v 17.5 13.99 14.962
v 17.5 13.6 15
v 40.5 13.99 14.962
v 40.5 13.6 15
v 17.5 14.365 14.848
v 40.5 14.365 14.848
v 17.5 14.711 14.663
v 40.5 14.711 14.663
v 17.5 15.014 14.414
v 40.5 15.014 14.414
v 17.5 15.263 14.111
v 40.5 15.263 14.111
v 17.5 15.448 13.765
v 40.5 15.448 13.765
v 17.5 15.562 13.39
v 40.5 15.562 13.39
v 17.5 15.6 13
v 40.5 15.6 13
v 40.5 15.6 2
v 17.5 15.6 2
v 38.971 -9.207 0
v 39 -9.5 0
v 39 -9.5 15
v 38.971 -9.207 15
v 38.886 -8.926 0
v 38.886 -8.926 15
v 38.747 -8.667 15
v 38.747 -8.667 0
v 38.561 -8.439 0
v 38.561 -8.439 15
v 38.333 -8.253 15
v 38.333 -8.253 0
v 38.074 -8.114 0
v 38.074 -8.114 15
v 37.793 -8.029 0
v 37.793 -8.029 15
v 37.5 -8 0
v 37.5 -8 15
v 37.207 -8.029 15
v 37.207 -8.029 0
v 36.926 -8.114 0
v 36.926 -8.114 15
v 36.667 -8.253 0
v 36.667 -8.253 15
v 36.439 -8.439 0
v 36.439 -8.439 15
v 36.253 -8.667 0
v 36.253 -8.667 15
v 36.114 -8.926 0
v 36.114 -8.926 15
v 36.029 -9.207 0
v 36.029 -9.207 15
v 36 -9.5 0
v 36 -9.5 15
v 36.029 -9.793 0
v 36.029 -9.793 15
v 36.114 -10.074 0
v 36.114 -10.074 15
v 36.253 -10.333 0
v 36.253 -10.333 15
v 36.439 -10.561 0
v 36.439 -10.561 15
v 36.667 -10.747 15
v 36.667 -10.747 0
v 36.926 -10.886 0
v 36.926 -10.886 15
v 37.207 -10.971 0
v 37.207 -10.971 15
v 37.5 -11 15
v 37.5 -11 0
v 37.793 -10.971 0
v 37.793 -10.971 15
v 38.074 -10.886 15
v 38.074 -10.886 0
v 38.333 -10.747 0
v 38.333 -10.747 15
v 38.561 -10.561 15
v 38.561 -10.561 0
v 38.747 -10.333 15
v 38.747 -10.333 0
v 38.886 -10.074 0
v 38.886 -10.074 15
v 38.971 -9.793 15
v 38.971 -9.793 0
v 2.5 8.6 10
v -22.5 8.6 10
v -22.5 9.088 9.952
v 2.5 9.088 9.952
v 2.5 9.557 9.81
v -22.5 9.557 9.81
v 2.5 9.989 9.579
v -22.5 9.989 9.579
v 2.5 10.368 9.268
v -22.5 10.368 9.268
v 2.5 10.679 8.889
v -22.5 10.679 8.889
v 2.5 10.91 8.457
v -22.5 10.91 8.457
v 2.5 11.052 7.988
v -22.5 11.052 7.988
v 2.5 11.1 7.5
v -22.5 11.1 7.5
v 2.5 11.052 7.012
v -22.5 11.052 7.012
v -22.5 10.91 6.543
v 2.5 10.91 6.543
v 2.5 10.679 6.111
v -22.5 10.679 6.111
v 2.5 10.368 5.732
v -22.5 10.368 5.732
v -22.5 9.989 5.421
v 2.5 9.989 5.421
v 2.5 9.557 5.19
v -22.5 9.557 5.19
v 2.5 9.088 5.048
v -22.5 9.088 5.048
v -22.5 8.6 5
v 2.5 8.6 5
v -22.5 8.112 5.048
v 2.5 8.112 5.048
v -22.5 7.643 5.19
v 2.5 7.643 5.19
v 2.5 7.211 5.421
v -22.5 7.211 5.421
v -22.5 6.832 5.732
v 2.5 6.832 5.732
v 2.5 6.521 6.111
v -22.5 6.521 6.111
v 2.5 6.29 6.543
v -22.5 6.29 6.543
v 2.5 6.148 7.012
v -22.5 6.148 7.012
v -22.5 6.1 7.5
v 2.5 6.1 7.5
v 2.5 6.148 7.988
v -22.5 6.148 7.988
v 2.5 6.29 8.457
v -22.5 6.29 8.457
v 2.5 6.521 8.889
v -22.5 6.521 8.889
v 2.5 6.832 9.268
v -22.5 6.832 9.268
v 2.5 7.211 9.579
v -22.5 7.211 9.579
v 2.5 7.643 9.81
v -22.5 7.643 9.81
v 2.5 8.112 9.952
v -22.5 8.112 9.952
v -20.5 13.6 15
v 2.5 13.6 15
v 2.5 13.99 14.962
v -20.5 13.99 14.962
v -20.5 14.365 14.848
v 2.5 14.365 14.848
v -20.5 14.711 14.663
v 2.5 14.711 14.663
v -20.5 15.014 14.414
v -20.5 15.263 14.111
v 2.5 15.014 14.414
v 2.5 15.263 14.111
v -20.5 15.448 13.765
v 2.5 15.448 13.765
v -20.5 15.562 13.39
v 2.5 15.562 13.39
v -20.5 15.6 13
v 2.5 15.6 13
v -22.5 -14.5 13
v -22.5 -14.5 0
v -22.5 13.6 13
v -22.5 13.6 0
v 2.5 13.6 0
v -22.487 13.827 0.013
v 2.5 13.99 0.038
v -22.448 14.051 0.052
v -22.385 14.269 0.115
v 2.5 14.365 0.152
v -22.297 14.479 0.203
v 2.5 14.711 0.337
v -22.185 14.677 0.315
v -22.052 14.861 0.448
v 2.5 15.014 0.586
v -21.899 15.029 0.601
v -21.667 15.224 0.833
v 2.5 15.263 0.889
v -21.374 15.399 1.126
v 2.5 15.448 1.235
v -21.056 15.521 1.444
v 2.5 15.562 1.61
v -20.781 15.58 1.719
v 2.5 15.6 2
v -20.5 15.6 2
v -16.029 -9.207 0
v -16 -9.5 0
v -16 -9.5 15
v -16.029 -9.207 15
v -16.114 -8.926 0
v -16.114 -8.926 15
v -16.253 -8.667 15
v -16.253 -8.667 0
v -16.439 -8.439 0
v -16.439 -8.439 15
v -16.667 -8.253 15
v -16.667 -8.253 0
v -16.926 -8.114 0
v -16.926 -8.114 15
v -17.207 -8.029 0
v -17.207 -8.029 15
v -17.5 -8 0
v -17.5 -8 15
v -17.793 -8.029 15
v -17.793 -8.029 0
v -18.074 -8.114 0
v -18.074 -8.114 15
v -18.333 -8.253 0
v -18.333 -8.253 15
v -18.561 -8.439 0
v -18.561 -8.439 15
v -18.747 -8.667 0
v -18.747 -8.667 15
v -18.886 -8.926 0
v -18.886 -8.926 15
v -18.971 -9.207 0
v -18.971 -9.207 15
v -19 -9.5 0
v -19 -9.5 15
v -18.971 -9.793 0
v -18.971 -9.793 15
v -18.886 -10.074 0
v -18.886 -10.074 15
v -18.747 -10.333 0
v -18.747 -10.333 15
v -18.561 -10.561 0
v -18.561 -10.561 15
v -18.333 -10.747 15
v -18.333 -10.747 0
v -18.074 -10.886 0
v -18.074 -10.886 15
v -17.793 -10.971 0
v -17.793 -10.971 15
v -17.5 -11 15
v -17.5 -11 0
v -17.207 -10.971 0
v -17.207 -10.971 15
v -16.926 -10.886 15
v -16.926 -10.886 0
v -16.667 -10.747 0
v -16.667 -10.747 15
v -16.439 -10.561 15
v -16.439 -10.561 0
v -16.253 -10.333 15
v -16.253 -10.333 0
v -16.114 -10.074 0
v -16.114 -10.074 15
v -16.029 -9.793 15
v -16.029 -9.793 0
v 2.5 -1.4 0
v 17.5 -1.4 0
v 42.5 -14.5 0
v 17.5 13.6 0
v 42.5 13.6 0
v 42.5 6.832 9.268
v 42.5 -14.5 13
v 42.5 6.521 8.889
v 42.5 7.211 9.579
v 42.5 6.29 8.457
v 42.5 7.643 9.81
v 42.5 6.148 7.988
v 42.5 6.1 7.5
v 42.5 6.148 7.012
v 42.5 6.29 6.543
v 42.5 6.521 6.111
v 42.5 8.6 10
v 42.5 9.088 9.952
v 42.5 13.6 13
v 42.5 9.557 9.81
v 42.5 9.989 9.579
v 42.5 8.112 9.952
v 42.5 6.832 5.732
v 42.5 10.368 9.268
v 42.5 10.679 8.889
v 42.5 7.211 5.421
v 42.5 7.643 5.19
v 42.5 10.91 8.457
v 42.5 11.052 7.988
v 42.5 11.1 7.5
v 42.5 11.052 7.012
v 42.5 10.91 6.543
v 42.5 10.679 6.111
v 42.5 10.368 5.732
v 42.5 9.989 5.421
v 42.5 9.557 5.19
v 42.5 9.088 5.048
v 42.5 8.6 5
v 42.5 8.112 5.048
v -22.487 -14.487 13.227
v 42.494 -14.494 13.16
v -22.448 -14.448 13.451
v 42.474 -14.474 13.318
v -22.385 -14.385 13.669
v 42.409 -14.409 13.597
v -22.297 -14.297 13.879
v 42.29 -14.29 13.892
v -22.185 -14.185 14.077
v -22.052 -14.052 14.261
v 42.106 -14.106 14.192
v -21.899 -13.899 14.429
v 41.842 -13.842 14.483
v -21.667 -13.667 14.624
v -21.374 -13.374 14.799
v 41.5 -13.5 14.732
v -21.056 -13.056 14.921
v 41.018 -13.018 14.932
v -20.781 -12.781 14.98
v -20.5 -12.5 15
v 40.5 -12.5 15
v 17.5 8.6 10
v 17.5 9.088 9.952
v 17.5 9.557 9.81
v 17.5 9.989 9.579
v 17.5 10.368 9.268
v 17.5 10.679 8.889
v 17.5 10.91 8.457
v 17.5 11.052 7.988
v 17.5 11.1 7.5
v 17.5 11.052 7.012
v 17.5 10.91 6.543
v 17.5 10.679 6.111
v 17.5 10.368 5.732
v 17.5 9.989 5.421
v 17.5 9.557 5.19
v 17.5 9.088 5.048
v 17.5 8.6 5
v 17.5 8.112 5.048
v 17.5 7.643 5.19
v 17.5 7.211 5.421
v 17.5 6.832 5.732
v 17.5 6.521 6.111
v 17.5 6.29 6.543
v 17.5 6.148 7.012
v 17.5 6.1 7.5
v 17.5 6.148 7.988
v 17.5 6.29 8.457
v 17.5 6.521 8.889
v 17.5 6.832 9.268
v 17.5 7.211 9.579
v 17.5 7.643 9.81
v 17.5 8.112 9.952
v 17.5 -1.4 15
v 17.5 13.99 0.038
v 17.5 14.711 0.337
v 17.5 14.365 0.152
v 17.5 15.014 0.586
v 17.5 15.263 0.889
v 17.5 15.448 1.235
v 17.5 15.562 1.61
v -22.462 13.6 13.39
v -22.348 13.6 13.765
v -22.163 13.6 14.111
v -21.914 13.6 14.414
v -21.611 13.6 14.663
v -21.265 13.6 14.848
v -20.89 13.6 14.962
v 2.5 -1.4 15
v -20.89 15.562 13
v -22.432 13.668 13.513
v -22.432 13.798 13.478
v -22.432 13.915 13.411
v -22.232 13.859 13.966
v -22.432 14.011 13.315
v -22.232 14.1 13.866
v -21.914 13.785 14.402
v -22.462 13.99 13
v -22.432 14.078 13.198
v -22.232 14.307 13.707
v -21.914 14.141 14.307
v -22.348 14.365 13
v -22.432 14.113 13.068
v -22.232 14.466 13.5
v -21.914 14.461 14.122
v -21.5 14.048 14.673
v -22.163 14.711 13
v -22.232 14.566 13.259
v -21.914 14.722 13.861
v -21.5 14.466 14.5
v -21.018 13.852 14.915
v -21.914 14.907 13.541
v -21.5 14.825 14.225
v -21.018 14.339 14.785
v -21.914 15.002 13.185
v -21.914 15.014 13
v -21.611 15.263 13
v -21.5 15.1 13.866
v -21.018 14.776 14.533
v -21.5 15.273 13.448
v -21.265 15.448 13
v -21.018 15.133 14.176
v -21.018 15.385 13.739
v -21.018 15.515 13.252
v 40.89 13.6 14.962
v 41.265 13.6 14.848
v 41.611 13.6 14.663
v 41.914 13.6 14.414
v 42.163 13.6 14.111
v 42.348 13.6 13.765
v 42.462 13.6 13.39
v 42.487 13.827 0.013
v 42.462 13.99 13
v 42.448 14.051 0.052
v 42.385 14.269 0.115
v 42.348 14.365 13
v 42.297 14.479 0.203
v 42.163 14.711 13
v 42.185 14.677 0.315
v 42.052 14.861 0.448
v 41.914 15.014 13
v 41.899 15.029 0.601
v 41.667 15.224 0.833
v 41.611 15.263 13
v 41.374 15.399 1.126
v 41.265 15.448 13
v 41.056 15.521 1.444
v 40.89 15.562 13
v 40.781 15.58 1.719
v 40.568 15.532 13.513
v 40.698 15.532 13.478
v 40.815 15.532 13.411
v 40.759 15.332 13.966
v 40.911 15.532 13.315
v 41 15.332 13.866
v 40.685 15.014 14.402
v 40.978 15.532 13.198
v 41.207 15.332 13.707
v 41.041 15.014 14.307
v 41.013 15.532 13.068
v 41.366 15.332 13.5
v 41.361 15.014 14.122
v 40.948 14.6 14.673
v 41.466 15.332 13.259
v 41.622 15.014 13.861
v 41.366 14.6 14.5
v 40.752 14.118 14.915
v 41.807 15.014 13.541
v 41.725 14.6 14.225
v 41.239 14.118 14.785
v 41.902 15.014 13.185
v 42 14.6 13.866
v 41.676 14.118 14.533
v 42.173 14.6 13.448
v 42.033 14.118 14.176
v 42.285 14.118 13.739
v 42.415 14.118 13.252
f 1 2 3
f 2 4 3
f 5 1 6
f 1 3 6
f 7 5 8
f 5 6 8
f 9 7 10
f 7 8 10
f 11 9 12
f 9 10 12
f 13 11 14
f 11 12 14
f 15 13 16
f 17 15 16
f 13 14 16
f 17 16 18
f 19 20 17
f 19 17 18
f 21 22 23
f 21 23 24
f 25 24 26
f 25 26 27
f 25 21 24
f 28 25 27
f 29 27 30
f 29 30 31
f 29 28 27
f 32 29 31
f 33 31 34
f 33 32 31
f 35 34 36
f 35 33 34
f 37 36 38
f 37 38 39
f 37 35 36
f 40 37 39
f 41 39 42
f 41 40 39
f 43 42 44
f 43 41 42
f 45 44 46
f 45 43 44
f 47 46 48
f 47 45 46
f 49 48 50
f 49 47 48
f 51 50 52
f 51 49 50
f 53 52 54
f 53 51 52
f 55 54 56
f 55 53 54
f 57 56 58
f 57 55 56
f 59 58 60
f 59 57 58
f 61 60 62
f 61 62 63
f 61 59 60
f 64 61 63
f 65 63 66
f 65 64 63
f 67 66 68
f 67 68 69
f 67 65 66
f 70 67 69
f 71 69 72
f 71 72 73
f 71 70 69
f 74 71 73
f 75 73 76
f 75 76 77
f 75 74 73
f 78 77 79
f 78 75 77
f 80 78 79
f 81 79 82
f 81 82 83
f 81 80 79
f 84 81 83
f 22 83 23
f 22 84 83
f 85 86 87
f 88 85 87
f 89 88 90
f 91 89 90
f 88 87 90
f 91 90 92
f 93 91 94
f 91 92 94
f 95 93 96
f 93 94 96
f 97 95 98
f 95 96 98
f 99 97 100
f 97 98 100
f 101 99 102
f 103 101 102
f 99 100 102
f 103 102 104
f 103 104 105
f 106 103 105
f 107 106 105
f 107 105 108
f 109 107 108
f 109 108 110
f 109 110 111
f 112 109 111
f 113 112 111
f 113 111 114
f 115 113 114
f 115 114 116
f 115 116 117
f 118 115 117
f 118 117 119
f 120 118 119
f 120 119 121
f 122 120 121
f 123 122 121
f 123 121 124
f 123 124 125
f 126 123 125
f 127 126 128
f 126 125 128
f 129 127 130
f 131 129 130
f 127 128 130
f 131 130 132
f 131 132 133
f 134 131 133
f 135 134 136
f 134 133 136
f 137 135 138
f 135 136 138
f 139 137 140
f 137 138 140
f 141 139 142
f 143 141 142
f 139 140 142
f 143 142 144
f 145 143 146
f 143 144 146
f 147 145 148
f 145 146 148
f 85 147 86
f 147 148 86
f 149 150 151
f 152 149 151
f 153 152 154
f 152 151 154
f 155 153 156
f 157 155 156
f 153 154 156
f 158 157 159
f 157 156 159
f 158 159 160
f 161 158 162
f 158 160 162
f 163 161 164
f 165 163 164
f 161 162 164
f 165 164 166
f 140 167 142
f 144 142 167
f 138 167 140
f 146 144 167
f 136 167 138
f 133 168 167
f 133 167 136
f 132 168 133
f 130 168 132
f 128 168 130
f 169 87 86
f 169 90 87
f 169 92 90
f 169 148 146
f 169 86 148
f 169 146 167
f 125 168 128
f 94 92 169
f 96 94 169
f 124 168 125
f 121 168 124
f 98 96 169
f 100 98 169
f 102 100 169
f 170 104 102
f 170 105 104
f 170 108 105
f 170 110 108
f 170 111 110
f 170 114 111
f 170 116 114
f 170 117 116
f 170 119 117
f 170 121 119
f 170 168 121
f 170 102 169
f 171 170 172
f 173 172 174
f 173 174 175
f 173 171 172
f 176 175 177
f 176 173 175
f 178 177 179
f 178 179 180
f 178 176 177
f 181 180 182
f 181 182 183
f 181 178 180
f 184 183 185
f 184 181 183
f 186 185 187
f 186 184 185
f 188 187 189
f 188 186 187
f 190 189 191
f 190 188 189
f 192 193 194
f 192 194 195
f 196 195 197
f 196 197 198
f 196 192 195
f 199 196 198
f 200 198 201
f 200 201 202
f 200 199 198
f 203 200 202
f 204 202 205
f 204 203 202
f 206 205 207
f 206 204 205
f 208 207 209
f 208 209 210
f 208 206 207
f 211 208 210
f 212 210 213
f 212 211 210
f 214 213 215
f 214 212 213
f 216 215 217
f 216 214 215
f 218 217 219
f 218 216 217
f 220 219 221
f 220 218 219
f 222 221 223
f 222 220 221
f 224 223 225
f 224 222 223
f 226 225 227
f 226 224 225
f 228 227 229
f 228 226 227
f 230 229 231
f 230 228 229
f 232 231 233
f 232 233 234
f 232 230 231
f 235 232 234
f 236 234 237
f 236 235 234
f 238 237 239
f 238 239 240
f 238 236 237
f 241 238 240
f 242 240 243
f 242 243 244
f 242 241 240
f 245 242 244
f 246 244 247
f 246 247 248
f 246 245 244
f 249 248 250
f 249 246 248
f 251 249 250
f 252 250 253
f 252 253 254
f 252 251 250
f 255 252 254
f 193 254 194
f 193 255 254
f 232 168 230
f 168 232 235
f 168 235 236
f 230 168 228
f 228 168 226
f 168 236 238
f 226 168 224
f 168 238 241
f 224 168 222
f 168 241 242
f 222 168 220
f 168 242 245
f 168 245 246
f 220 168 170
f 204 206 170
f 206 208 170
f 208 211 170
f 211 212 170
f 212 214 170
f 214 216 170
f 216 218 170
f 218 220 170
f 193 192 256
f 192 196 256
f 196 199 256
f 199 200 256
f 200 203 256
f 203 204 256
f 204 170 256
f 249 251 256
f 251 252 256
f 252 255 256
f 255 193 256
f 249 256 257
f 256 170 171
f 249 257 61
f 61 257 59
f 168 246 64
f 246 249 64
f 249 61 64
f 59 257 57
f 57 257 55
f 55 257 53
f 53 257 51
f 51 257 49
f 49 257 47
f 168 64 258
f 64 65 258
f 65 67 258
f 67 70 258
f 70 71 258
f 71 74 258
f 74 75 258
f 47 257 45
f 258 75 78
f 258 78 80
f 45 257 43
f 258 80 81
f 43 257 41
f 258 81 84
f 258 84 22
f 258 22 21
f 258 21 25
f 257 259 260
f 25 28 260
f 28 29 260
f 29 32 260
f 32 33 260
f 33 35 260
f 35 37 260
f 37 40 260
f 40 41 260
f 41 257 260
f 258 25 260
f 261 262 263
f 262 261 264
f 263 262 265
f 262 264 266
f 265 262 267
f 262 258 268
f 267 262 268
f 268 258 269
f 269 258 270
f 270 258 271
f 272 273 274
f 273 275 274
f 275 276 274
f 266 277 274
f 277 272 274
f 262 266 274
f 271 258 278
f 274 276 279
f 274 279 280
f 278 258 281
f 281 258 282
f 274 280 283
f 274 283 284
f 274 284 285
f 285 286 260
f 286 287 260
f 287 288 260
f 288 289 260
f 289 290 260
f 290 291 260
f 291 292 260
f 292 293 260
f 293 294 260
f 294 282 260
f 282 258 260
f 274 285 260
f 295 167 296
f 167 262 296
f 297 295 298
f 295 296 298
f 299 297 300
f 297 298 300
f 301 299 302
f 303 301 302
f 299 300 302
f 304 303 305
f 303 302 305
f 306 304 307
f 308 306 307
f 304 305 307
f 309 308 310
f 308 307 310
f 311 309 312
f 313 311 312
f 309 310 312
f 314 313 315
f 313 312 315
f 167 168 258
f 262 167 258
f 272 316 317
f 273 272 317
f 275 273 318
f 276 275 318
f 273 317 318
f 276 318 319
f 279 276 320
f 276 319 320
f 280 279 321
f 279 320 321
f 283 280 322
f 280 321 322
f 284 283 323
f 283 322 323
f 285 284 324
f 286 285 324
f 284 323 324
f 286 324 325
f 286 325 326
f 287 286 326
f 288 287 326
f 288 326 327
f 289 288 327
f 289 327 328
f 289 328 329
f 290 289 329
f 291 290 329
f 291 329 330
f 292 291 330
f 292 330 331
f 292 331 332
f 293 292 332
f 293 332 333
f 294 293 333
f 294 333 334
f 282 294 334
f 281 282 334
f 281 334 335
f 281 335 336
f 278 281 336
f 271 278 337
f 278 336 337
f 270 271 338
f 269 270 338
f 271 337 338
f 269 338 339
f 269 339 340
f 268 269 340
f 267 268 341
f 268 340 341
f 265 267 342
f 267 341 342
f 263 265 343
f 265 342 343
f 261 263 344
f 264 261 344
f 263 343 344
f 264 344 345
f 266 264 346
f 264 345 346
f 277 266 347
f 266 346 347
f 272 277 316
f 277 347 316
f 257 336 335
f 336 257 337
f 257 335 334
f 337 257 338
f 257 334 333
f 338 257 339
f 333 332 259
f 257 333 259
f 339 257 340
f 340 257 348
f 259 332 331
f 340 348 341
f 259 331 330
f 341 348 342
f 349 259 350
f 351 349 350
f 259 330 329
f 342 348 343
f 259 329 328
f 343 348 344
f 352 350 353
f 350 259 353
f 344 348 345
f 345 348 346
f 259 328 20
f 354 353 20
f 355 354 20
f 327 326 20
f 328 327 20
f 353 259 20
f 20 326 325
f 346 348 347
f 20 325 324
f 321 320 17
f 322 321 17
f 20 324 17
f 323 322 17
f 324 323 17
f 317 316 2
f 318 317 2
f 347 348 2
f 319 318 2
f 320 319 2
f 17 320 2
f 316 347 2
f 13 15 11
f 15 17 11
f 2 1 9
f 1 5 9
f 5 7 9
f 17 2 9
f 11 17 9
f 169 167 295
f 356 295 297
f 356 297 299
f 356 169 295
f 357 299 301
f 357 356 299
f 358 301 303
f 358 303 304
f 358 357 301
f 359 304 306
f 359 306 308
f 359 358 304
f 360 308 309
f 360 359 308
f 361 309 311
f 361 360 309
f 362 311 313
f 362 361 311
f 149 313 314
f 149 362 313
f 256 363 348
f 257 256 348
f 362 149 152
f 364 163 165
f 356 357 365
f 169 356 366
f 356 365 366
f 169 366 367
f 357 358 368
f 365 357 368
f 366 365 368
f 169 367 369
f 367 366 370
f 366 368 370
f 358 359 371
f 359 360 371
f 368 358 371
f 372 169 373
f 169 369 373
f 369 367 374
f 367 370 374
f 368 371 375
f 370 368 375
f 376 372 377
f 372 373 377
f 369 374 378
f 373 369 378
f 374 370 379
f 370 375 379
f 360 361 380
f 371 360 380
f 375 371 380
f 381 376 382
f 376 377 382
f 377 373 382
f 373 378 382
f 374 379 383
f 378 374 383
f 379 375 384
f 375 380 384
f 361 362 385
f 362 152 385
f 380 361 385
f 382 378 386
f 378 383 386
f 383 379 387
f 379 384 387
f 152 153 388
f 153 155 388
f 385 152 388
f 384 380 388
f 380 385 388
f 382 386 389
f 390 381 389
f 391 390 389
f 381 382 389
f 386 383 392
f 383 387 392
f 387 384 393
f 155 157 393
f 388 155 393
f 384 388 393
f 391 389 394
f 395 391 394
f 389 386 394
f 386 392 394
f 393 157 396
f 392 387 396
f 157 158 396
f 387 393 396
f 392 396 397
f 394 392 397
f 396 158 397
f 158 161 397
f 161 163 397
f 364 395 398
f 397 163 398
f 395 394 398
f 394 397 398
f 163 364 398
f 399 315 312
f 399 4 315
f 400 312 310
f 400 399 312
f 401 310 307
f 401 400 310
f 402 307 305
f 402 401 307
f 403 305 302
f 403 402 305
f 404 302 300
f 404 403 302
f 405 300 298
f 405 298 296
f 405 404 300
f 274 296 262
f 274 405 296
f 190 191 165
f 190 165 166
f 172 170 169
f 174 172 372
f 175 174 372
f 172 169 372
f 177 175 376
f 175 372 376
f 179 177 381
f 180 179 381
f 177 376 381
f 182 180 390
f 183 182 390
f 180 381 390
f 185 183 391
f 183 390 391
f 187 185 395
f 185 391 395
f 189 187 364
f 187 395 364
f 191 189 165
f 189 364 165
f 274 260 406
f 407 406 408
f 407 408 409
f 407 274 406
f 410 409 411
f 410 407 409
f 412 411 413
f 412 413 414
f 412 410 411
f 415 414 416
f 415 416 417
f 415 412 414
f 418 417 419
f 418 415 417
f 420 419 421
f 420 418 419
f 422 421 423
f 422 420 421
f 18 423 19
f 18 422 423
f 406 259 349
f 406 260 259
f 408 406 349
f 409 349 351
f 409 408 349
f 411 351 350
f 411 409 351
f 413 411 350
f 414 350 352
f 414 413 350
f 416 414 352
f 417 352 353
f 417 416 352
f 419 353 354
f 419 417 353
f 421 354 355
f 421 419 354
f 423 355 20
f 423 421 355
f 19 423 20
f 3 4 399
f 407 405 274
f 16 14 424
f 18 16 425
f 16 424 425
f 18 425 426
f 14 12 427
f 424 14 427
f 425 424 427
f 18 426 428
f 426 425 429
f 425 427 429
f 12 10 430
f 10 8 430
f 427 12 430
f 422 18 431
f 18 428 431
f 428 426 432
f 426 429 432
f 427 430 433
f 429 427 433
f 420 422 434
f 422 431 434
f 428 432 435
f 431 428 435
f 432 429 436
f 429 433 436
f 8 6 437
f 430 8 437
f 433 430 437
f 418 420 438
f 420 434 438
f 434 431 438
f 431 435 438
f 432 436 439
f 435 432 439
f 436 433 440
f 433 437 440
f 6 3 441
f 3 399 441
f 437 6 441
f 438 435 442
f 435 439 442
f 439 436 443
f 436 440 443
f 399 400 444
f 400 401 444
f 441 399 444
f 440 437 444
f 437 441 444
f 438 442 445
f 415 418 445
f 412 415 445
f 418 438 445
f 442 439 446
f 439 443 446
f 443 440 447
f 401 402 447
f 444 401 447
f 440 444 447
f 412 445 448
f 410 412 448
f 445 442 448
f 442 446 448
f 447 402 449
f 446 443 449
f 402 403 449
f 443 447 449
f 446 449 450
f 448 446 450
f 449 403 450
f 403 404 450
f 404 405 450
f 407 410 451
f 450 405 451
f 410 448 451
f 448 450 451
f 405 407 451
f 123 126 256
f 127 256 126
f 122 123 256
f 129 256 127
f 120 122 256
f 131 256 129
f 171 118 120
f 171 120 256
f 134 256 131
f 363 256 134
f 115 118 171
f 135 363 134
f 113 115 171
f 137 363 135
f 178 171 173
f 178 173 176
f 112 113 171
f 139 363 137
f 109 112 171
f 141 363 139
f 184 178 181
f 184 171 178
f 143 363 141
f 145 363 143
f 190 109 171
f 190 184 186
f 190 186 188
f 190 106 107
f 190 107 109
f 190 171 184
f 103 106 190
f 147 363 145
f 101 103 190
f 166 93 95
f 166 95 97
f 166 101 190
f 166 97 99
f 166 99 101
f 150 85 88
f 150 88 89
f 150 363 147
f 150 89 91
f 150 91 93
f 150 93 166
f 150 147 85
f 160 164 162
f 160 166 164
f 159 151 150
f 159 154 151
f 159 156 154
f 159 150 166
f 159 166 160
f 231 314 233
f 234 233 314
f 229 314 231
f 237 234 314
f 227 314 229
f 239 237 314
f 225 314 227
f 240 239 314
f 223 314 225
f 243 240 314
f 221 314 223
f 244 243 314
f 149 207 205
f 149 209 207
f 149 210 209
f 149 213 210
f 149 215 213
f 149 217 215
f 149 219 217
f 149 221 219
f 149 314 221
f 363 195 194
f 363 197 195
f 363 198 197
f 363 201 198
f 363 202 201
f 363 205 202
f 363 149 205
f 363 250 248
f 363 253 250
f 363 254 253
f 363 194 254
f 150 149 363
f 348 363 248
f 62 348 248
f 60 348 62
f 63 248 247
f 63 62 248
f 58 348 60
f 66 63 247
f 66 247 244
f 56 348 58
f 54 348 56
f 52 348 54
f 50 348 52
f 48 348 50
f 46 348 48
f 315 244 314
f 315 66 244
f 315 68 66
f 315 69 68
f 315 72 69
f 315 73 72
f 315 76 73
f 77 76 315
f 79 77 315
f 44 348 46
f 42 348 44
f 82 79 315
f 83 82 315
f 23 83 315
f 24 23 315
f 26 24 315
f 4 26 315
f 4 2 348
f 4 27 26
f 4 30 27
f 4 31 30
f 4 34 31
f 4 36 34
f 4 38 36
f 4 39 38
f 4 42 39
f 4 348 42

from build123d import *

# Parameters (mm, degrees)
SKETCH1_W           = 65
SKETCH1_H           = 30.1
SKETCH1_R           = 1.5
BOSS_EXTRUDE1_DEPTH = 15
SKETCH2_R           = 2.5
CUT_EXTRUDE1_DEPTH  = 75
SKETCH3_W           = 15
SKETCH3_H           = 17
CUT_EXTRUDE2_DEPTH  = 75
FILLET2_R           = 2


with BuildPart() as part:
    # Sketch1 → Boss-Extrude1 (new body)
    with BuildSketch(Plane.XY):
        with Locations((10, 0.55)):
            Rectangle(SKETCH1_W, SKETCH1_H)
        with Locations((-17.5, -9.5)):
            Circle(SKETCH1_R, mode=Mode.SUBTRACT)
        with Locations((37.5, -9.5)):
            Circle(SKETCH1_R, mode=Mode.SUBTRACT)
    extrude(amount=BOSS_EXTRUDE1_DEPTH)

    # Sketch2 → Cut-Extrude1 (cut)
    with BuildSketch(Plane.ZY.offset(22.5)):
        with Locations((7.5, 8.6)):
            Circle(SKETCH2_R)
    extrude(amount=-CUT_EXTRUDE1_DEPTH, mode=Mode.SUBTRACT)

    # Sketch3 → Cut-Extrude2 (cut)
    with BuildSketch(Plane.XY.offset(15)):
        with Locations((10, 7.1)):
            Rectangle(SKETCH3_W, SKETCH3_H)
    extrude(amount=-CUT_EXTRUDE2_DEPTH, mode=Mode.SUBTRACT)

    # Fillet2
    fillet2_edges = [part.edges().sort_by_distance(p)[0] for p in [
        (42.5, 0.55, 15),
        (30, 15.6, 15),
        (-10, 15.6, 0),
        (-10, 15.6, 15),
        (-22.5, 0.55, 15),
        (30, 15.6, 0),
        (-22.5, 15.6, 7.5),
        (42.5, 15.6, 7.5),
        (10, -14.5, 15),
    ]]
    fillet(fillet2_edges, radius=FILLET2_R)


solid = part.part
